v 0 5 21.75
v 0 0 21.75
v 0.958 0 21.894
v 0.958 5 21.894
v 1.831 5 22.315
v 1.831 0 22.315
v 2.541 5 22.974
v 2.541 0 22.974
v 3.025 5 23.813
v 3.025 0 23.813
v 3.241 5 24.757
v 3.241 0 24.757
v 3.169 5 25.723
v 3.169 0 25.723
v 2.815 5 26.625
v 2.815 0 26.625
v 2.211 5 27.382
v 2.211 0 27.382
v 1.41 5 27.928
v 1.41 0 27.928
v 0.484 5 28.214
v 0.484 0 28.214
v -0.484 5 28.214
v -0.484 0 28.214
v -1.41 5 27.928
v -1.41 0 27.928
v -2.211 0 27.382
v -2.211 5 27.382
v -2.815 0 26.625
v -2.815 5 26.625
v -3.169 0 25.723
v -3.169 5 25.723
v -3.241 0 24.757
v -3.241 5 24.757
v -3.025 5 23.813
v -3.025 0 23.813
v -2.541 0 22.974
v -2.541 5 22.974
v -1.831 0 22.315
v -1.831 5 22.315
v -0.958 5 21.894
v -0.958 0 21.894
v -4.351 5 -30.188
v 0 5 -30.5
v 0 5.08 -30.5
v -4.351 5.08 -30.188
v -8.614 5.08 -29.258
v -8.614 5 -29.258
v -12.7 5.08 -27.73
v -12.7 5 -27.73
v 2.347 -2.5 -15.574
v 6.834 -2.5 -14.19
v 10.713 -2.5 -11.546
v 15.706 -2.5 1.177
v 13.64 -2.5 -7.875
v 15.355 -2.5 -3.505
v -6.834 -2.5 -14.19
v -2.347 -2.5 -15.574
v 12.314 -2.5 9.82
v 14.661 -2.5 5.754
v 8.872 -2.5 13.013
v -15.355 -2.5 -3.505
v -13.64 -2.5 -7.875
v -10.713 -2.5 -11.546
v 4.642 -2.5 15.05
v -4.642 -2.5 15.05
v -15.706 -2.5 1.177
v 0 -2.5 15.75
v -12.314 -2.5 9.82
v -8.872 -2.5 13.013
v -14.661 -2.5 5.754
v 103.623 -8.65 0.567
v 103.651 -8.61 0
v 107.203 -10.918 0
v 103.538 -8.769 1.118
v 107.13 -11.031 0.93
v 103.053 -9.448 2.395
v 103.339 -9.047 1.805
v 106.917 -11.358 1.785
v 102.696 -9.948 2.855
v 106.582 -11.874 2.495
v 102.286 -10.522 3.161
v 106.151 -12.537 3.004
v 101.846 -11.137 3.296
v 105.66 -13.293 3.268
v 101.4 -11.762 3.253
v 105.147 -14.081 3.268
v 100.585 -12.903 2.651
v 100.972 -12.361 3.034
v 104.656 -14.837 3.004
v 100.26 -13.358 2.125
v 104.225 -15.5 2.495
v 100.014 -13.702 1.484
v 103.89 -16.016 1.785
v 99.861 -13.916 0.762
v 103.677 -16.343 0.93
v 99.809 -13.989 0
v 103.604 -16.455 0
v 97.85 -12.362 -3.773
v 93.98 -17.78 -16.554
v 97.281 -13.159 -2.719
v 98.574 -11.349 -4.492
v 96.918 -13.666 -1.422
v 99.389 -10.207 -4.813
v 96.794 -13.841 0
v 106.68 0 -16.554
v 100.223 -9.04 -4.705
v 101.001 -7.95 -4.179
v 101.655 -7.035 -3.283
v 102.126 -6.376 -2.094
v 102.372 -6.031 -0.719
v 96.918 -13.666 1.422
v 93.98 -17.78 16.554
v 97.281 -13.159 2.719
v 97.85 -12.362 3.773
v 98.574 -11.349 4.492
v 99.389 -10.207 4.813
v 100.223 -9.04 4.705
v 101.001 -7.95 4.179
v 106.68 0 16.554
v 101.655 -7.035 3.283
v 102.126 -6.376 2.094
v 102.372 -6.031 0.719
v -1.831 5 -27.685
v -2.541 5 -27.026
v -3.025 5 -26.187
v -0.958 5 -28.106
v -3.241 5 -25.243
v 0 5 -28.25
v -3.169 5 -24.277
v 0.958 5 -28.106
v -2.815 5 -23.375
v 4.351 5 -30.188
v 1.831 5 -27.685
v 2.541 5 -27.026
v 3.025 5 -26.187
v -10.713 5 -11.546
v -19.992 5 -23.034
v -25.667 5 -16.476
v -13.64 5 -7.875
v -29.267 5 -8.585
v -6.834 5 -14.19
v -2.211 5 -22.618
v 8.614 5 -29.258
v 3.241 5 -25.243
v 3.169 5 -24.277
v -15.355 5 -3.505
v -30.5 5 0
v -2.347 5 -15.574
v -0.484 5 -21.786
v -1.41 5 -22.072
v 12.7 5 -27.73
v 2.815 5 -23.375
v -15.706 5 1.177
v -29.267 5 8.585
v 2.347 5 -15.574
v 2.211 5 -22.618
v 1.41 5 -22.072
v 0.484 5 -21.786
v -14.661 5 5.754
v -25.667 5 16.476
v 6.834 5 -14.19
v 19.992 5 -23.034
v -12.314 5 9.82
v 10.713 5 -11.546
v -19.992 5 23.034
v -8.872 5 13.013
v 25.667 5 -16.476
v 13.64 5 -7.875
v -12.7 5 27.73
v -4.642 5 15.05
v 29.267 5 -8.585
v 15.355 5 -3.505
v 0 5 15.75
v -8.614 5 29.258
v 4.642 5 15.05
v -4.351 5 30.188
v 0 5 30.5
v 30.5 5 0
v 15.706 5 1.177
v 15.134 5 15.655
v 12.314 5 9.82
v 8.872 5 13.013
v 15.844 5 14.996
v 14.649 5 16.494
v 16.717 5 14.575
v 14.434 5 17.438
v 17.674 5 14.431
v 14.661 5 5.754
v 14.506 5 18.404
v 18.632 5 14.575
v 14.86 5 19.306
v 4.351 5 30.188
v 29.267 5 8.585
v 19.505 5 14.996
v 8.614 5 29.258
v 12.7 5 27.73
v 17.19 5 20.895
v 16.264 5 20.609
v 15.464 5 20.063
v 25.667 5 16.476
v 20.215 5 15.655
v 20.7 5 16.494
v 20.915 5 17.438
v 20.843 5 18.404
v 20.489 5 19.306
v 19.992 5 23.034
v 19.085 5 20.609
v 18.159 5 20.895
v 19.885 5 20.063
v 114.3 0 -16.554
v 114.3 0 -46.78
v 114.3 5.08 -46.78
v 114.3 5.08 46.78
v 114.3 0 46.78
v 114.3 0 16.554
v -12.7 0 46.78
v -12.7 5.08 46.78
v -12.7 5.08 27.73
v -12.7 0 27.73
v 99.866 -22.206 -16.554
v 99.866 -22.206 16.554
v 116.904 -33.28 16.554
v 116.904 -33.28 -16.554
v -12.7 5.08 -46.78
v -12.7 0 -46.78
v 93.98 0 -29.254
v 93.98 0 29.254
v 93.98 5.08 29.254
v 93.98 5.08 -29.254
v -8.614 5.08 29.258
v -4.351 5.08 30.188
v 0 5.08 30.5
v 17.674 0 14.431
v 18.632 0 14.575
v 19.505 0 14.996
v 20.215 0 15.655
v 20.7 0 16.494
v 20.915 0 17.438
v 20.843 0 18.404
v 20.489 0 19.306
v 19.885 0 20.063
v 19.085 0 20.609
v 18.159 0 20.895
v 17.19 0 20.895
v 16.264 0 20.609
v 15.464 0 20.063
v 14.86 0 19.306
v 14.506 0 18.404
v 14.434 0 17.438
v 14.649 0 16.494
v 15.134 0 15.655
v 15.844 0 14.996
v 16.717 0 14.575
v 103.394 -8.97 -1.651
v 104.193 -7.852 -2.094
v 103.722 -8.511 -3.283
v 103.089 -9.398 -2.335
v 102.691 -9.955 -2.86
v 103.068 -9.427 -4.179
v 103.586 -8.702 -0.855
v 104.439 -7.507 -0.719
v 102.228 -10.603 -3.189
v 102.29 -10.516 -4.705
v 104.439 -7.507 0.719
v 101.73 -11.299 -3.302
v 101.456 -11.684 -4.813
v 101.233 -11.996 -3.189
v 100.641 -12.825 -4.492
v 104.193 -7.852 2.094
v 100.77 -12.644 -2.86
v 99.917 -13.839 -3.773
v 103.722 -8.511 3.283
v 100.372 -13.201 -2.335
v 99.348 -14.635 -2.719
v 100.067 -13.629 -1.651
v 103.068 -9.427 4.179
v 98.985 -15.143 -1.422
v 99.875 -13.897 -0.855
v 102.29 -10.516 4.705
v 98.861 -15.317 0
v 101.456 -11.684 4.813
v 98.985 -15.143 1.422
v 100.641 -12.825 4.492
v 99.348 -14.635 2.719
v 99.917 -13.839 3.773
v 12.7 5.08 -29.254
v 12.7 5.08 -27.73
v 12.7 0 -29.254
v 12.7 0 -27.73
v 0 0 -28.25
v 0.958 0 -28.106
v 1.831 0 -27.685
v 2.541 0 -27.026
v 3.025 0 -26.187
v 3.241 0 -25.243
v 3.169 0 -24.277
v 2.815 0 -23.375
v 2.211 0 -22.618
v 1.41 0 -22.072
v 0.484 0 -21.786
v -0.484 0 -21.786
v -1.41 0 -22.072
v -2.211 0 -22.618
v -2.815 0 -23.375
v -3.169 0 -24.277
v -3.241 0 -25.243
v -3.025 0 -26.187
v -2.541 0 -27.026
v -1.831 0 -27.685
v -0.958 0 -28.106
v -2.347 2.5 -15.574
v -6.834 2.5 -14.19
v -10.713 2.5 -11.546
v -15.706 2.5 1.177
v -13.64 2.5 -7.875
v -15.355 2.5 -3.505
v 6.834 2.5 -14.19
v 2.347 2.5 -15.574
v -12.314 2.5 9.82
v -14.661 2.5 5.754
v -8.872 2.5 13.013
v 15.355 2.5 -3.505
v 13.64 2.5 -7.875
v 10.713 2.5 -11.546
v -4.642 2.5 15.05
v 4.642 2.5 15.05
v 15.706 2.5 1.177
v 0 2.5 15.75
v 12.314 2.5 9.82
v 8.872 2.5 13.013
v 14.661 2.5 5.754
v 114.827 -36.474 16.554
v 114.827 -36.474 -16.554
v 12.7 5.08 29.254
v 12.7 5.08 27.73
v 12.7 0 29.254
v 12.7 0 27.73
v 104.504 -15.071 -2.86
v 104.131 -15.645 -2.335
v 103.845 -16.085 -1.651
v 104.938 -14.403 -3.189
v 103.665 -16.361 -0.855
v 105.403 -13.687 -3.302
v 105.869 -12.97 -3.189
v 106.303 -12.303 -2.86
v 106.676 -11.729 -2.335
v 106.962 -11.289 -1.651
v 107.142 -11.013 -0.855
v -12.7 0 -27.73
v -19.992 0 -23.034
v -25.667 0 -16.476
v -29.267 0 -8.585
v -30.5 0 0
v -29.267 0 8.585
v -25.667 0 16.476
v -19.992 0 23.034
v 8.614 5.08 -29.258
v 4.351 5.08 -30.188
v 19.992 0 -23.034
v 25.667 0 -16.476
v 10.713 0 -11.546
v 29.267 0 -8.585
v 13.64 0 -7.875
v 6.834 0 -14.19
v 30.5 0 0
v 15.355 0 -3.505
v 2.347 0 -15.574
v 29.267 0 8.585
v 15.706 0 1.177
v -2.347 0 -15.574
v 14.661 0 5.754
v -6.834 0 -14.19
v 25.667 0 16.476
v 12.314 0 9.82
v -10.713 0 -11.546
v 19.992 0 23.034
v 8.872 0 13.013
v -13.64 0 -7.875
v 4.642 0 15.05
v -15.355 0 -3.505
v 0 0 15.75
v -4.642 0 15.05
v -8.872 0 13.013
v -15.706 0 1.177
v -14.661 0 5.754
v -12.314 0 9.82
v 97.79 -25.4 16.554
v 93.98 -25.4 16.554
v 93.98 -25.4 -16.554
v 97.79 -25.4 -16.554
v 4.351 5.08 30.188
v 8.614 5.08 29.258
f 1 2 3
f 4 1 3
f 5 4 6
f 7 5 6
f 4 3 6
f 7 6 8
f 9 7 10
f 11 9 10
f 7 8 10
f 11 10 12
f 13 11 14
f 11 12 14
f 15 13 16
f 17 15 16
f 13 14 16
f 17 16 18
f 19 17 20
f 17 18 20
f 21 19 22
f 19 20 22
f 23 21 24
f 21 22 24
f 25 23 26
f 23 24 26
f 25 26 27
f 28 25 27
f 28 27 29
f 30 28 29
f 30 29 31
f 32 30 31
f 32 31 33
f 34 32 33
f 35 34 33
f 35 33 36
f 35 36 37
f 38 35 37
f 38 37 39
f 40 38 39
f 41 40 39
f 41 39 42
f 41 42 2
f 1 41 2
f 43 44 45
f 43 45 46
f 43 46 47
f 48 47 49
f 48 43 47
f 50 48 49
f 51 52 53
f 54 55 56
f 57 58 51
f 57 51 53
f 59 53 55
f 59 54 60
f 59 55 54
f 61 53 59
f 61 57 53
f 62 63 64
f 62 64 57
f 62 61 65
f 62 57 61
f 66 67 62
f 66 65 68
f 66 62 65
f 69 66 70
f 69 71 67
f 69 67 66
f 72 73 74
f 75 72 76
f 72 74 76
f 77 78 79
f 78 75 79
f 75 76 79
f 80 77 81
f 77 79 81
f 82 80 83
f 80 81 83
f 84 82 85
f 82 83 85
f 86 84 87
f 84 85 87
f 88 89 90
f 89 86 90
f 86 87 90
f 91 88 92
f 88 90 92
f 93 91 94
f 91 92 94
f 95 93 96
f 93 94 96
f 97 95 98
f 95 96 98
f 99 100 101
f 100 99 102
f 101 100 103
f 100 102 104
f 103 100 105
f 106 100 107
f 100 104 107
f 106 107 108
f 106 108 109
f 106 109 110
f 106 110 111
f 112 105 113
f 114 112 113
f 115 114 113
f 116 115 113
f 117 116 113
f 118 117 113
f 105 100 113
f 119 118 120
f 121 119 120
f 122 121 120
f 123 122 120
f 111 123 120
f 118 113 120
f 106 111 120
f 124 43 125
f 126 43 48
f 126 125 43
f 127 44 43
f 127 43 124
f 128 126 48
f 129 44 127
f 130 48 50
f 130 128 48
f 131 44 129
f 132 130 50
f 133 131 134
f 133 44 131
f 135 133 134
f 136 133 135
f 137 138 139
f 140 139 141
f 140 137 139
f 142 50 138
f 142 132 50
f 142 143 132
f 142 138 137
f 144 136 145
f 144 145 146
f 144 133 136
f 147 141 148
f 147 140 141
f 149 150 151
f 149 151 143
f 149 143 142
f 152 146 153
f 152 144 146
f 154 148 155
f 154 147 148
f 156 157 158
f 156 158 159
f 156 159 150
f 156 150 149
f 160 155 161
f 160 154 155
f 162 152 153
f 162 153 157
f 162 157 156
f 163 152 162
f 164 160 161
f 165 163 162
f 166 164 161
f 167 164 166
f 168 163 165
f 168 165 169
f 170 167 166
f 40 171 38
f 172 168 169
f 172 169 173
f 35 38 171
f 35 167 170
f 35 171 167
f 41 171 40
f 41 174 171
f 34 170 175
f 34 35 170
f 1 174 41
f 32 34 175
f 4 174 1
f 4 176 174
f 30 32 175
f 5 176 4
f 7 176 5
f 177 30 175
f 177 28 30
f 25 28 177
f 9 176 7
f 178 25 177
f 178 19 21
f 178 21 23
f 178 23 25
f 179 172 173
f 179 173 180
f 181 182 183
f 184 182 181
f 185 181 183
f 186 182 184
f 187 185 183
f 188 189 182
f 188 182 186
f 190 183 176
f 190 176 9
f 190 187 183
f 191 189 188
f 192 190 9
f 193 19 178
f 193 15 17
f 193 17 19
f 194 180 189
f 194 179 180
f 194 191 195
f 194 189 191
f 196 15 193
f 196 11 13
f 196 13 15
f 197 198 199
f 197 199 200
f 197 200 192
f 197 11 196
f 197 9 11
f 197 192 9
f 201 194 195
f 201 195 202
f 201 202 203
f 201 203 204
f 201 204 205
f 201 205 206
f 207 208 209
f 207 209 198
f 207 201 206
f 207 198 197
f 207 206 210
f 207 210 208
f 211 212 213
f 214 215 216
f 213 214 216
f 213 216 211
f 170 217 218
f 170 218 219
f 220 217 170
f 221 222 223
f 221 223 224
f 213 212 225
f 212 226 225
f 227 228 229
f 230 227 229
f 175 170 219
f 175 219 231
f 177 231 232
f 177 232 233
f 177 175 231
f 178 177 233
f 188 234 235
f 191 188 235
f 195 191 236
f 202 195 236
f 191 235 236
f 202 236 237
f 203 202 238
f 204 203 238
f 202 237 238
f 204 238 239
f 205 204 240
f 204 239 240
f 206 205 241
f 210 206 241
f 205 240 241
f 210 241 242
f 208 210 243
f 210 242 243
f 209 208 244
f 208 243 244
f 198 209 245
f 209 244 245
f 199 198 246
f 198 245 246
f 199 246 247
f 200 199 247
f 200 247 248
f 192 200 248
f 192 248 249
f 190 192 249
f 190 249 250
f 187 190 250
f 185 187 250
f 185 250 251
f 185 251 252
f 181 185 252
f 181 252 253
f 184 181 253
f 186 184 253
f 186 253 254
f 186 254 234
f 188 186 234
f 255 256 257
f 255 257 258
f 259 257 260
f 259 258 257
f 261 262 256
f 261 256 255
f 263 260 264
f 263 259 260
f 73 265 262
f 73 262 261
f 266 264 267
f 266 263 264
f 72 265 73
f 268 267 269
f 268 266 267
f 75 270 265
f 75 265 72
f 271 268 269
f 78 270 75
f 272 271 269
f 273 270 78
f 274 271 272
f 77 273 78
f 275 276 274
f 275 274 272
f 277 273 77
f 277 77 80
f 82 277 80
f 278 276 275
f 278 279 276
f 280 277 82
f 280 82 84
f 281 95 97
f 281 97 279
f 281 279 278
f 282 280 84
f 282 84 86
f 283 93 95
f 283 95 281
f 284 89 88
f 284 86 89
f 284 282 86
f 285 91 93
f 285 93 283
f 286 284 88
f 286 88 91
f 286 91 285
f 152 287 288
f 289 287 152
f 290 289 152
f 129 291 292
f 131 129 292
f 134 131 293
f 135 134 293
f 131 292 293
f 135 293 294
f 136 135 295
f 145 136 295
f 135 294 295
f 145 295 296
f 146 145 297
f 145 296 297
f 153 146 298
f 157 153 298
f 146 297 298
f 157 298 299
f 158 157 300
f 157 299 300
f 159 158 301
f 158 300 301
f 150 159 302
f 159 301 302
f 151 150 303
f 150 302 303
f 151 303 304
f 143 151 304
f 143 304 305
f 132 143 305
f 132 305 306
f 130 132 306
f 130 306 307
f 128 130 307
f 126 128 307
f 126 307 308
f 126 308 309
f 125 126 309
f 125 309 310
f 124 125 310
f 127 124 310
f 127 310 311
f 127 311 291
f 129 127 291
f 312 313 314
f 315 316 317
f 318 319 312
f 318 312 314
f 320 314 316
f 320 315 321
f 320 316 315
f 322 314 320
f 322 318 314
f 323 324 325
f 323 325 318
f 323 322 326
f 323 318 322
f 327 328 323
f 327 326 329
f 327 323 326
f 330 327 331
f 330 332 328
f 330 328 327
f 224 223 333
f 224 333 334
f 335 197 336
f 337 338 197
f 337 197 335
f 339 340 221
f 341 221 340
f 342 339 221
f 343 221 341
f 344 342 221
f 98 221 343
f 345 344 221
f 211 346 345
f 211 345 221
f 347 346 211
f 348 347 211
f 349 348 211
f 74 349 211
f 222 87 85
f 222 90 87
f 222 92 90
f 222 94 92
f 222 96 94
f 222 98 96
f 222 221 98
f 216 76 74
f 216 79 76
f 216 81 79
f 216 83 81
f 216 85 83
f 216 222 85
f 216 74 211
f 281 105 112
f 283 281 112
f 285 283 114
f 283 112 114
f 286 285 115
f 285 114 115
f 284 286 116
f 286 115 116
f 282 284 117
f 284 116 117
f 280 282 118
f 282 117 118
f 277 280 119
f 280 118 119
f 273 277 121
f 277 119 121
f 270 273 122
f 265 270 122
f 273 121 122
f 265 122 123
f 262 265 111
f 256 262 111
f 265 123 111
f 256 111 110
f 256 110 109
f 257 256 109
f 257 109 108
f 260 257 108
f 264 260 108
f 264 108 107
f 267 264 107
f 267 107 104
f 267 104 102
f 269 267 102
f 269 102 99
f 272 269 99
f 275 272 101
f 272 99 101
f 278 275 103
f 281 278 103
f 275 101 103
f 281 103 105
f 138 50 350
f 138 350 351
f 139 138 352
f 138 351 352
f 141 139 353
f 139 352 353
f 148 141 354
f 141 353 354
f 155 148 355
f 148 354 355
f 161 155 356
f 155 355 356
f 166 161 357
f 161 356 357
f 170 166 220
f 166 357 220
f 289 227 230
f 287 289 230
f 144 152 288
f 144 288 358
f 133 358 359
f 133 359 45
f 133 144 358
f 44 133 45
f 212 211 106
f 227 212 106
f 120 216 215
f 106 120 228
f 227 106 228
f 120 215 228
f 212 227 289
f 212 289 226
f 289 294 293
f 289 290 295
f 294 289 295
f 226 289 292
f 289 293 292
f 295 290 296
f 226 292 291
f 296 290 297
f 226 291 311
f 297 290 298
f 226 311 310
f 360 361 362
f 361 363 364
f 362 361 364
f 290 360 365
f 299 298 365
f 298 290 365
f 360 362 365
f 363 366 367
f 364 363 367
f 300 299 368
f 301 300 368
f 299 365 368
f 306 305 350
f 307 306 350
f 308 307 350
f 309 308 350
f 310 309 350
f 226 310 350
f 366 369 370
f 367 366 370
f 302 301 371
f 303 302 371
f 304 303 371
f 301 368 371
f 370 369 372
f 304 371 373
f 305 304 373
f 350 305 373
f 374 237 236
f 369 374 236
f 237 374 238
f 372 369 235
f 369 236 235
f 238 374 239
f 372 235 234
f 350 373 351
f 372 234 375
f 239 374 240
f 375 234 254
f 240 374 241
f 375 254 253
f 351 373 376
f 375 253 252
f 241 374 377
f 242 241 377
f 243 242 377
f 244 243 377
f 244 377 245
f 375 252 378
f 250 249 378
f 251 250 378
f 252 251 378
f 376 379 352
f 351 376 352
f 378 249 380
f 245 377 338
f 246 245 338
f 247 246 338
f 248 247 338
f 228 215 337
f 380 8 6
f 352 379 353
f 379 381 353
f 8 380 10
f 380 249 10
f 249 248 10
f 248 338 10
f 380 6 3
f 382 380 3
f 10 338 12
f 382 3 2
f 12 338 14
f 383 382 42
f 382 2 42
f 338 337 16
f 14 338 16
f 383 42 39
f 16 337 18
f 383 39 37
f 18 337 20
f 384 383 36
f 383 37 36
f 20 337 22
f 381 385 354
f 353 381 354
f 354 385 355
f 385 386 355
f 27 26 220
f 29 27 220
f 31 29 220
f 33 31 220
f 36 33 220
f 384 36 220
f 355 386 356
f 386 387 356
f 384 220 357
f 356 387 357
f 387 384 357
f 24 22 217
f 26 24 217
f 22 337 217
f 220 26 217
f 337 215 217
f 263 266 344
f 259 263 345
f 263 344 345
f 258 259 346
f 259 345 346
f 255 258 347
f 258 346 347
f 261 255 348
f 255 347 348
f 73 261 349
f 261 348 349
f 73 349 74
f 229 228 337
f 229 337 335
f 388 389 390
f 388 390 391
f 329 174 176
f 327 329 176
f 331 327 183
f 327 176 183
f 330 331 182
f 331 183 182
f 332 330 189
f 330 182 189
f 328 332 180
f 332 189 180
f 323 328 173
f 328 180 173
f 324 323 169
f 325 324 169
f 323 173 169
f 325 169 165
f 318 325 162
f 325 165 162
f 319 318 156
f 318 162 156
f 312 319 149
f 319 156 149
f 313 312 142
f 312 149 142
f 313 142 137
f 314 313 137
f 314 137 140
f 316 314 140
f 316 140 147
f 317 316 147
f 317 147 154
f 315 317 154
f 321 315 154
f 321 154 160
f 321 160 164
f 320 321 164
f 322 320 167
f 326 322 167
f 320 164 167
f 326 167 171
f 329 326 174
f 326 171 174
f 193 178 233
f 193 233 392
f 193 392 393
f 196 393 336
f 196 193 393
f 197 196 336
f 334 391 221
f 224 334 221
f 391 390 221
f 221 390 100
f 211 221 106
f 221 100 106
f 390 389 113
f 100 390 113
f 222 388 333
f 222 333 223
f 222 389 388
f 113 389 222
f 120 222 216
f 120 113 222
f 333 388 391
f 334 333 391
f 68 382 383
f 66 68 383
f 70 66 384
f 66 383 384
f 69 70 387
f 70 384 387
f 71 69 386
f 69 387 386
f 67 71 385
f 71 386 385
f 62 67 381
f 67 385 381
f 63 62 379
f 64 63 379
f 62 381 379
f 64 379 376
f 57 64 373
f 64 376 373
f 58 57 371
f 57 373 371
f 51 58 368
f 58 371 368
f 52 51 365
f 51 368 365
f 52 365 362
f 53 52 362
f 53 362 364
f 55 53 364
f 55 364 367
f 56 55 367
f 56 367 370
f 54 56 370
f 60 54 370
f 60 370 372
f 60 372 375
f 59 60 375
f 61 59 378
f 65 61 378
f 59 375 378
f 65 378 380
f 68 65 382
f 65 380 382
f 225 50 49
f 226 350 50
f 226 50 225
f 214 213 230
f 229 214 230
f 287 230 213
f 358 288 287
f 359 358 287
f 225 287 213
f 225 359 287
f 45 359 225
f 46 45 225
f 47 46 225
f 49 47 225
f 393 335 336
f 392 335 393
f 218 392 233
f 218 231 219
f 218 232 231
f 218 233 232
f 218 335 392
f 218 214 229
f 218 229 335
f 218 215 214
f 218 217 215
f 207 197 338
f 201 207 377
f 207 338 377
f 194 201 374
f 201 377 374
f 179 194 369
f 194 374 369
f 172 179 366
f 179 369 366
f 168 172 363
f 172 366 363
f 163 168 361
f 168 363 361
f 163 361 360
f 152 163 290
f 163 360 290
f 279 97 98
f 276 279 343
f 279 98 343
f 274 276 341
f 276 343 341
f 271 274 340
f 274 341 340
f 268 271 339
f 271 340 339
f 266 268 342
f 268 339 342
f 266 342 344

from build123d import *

# Parameters (mm, degrees)
SKETCH1_R           = 30.5
BOSS_EXTRUDE1_DEPTH = 5
SKETCH2_R           = 15.75
CUT_EXTRUDE1_DEPTH  = 2.5
SKETCH3_R           = 15.75
BOSS_EXTRUDE2_DEPTH = 2.5
SKETCH4_R           = 3.25
CUT_EXTRUDE2_DEPTH  = 5.08
SKETCH5_R           = 3.25
CUT_EXTRUDE3_DEPTH  = 5.08
SKETCH6_R           = 3.25
CUT_EXTRUDE4_DEPTH  = 5.08
BOSS_EXTRUDE3_DEPTH = 5.08
BOSS_EXTRUDE4_DEPTH = 5.08
SKETCH9_W           = 17.526
SKETCH9_H           = 5.08
BOSS_EXTRUDE5_DEPTH = 101.6
SKETCH10_W          = 17.526
SKETCH10_H          = 5.08
BOSS_EXTRUDE6_DEPTH = 101.6
SKETCH11_W          = 20.32
SKETCH11_H          = 5.08
BOSS_EXTRUDE7_DEPTH = 63.5
SKETCH12_W          = 20.32
SKETCH12_H          = 33.10825604
BOSS_EXTRUDE8_DEPTH = 25.4
CUT_EXTRUDE5_DEPTH  = 33.274
CUT_EXTRUDE6_DEPTH  = 33.274
SKETCH16_W          = 33.10825604
SKETCH16_H          = 3.81
BOSS_EXTRUDE9_DEPTH = 20.32
CUT_EXTRUDE7_DEPTH  = 7.62
SKETCH20_R          = 4.826
CUT_EXTRUDE9_DEPTH  = 2.54


with BuildPart() as part:
    # Sketch1 → Boss-Extrude1 (new body)
    with BuildSketch(Plane(origin=(0, 0, 0), x_dir=(1, 0, 0), z_dir=(0, 1, 0))):
        with Locations(Location((0, 0, 0), (0, 0, 270))):
            Circle(SKETCH1_R)
    extrude(amount=BOSS_EXTRUDE1_DEPTH)

    # Sketch2 → Cut-Extrude1 (cut)
    with BuildSketch(Plane(origin=(0, 5, 0), x_dir=(1, 0, 0), z_dir=(0, 1, 0))):
        with Locations(Location((0, 0, 0), (0, 0, 270))):
            Circle(SKETCH2_R)
    extrude(amount=-CUT_EXTRUDE1_DEPTH, mode=Mode.SUBTRACT)

    # Sketch3 → Boss-Extrude2 (add)
    with BuildSketch(Plane.XZ):
        with Locations(Location((0, 0, 0), (0, 0, 90))):
            Circle(SKETCH3_R)
    extrude(amount=BOSS_EXTRUDE2_DEPTH)

    # Sketch4 → Cut-Extrude2 (cut)
    with BuildSketch(Plane(origin=(0, 0, 0), x_dir=(-1, 0, 0), z_dir=(0, -1, 0))):
        with Locations(Location((0, 25, 0), (0, 0, 90))):
            Circle(SKETCH4_R)
    extrude(amount=-CUT_EXTRUDE2_DEPTH, mode=Mode.SUBTRACT)

    # Sketch5 → Cut-Extrude3 (cut)
    with BuildSketch(Plane.XZ):
        with Locations(Location((0, 25, 0), (0, 0, 270))):
            Circle(SKETCH5_R)
    extrude(amount=-CUT_EXTRUDE3_DEPTH, mode=Mode.SUBTRACT)

    # Sketch6 → Cut-Extrude4 (cut)
    with BuildSketch(Plane.XZ):
        with Locations(Location((17.674476483, 17.680862, 0), (0, 0, 270))):
            Circle(SKETCH6_R)
    extrude(amount=-CUT_EXTRUDE4_DEPTH, mode=Mode.SUBTRACT)

    # Sketch7 → Boss-Extrude3 (add)
    with BuildSketch(Plane(origin=(0, 0, 0), x_dir=(-1, 0, 0), z_dir=(0, -1, 0))):
        with BuildLine():
            ThreePointArc((12.7, -27.73012802), (6.499272859, -29.79948745), (0, -30.5))
            ThreePointArc((0, -30.5), (-6.499272859, -29.79948745), (-12.7, -27.73012802))
            Line((-12.7, -27.73012802), (-12.7, -46.78012802))
            Line((-12.7, -46.78012802), (12.7, -46.78012802))
            Line((12.7, -46.78012802), (12.7, -27.73012802))
        make_face()
    extrude(amount=-BOSS_EXTRUDE3_DEPTH)

    # Sketch8 → Boss-Extrude4 (add)
    with BuildSketch(Plane.XZ):
        with BuildLine():
            ThreePointArc((0, -30.5), (-6.499272859, -29.79948745), (-12.7, -27.73012802))
            Line((-12.7, -27.73012802), (-12.7, -46.78012802))
            Line((-12.7, -46.78012802), (12.7, -46.78012802))
            Line((12.7, -46.78012802), (12.7, -27.73012802))
            ThreePointArc((12.7, -27.73012802), (6.499272859, -29.79948745), (0, -30.5))
        make_face()
    extrude(amount=-BOSS_EXTRUDE4_DEPTH)

    # Sketch9 → Boss-Extrude5 (add)
    with BuildSketch(Plane(origin=(12.7, 0, 0), x_dir=(0, 0, -1), z_dir=(1, 0, 0))):
        with Locations((38.01712802, 2.54)):
            Rectangle(SKETCH9_W, SKETCH9_H)
    extrude(amount=BOSS_EXTRUDE5_DEPTH)

    # Sketch10 → Boss-Extrude6 (add)
    with BuildSketch(Plane(origin=(12.7, 0, 0), x_dir=(0, 0, -1), z_dir=(1, 0, 0))):
        with Locations((-38.01712802, 2.54)):
            Rectangle(SKETCH10_W, SKETCH10_H)
    extrude(amount=BOSS_EXTRUDE6_DEPTH)

    # Sketch11 → Boss-Extrude7 (add)
    with BuildSketch(Plane(origin=(0, 0, 29.25412802), x_dir=(-1, 0, 0), z_dir=(0, 0, -1))):
        with Locations((-104.14, 2.54)):
            Rectangle(SKETCH11_W, SKETCH11_H)
    extrude(amount=BOSS_EXTRUDE7_DEPTH)

    # Sketch12 → Boss-Extrude8 (add)
    with BuildSketch(Plane.XZ):
        with Locations((104.14, 0)):
            Rectangle(SKETCH12_W, SKETCH12_H)
    extrude(amount=BOSS_EXTRUDE8_DEPTH)

    # Sketch13 → Cut-Extrude5 (cut)
    with BuildSketch(Plane.XY.offset(16.55412802)):
        Polygon((114.3, -25.4), (97.79, -25.4), (114.3, 0), align=None)
    extrude(amount=-CUT_EXTRUDE5_DEPTH, mode=Mode.SUBTRACT)

    # Sketch14 → Cut-Extrude6 (cut)
    with BuildSketch(Plane.XY.offset(16.55412802)):
        Polygon((93.98, 0), (93.98, -17.78), (106.68, 0), align=None)
    extrude(amount=-CUT_EXTRUDE6_DEPTH, mode=Mode.SUBTRACT)

    # Sketch16 → Boss-Extrude9 (add)
    with BuildSketch(Plane(origin=(80.351493849, -52.228471002, 0), x_dir=(0, 0, -1), z_dir=(0.8384436163006371, -0.5449883505954142, 0))):
        with Locations((0, 33.902942951)):
            Rectangle(SKETCH16_W, SKETCH16_H)
    extrude(amount=BOSS_EXTRUDE9_DEPTH)

    # Sketch18 → Cut-Extrude7 (cut)
    with BuildSketch(Plane(origin=(80.351493849, -52.228471002, 0), x_dir=(0, 0, -1), z_dir=(0.8384436163006371, -0.5449883505954142, 0))):
        with BuildLine():
            ThreePointArc((0, 49.269942951), (-3.302, 45.967942951), (0, 42.665942951))
            Line((0, 42.665942951), (0, 49.269942951))
        make_face()
        with BuildLine():
            Line((0, 49.269942951), (0, 42.665942951))
            ThreePointArc((0, 42.665942951), (2.334866591, 43.633076359), (3.302, 45.967942951))
            ThreePointArc((3.302, 45.967942951), (2.334866591, 48.302809542), (0, 49.269942951))
        make_face()
    extrude(amount=-CUT_EXTRUDE7_DEPTH, mode=Mode.SUBTRACT)

    # Sketch20 → Cut-Extrude9 (cut)
    with BuildSketch(Plane(origin=(70.639459459, -50.456756757, 0), x_dir=(0, 0, 1), z_dir=(-0.8137334712067354, 0.5812381937190958, 0))):
        with Locations(Location((0, 49.823352123, 0), (0, 0, 270))):
            Circle(SKETCH20_R)
    extrude(amount=-CUT_EXTRUDE9_DEPTH, mode=Mode.SUBTRACT)


solid = part.part
